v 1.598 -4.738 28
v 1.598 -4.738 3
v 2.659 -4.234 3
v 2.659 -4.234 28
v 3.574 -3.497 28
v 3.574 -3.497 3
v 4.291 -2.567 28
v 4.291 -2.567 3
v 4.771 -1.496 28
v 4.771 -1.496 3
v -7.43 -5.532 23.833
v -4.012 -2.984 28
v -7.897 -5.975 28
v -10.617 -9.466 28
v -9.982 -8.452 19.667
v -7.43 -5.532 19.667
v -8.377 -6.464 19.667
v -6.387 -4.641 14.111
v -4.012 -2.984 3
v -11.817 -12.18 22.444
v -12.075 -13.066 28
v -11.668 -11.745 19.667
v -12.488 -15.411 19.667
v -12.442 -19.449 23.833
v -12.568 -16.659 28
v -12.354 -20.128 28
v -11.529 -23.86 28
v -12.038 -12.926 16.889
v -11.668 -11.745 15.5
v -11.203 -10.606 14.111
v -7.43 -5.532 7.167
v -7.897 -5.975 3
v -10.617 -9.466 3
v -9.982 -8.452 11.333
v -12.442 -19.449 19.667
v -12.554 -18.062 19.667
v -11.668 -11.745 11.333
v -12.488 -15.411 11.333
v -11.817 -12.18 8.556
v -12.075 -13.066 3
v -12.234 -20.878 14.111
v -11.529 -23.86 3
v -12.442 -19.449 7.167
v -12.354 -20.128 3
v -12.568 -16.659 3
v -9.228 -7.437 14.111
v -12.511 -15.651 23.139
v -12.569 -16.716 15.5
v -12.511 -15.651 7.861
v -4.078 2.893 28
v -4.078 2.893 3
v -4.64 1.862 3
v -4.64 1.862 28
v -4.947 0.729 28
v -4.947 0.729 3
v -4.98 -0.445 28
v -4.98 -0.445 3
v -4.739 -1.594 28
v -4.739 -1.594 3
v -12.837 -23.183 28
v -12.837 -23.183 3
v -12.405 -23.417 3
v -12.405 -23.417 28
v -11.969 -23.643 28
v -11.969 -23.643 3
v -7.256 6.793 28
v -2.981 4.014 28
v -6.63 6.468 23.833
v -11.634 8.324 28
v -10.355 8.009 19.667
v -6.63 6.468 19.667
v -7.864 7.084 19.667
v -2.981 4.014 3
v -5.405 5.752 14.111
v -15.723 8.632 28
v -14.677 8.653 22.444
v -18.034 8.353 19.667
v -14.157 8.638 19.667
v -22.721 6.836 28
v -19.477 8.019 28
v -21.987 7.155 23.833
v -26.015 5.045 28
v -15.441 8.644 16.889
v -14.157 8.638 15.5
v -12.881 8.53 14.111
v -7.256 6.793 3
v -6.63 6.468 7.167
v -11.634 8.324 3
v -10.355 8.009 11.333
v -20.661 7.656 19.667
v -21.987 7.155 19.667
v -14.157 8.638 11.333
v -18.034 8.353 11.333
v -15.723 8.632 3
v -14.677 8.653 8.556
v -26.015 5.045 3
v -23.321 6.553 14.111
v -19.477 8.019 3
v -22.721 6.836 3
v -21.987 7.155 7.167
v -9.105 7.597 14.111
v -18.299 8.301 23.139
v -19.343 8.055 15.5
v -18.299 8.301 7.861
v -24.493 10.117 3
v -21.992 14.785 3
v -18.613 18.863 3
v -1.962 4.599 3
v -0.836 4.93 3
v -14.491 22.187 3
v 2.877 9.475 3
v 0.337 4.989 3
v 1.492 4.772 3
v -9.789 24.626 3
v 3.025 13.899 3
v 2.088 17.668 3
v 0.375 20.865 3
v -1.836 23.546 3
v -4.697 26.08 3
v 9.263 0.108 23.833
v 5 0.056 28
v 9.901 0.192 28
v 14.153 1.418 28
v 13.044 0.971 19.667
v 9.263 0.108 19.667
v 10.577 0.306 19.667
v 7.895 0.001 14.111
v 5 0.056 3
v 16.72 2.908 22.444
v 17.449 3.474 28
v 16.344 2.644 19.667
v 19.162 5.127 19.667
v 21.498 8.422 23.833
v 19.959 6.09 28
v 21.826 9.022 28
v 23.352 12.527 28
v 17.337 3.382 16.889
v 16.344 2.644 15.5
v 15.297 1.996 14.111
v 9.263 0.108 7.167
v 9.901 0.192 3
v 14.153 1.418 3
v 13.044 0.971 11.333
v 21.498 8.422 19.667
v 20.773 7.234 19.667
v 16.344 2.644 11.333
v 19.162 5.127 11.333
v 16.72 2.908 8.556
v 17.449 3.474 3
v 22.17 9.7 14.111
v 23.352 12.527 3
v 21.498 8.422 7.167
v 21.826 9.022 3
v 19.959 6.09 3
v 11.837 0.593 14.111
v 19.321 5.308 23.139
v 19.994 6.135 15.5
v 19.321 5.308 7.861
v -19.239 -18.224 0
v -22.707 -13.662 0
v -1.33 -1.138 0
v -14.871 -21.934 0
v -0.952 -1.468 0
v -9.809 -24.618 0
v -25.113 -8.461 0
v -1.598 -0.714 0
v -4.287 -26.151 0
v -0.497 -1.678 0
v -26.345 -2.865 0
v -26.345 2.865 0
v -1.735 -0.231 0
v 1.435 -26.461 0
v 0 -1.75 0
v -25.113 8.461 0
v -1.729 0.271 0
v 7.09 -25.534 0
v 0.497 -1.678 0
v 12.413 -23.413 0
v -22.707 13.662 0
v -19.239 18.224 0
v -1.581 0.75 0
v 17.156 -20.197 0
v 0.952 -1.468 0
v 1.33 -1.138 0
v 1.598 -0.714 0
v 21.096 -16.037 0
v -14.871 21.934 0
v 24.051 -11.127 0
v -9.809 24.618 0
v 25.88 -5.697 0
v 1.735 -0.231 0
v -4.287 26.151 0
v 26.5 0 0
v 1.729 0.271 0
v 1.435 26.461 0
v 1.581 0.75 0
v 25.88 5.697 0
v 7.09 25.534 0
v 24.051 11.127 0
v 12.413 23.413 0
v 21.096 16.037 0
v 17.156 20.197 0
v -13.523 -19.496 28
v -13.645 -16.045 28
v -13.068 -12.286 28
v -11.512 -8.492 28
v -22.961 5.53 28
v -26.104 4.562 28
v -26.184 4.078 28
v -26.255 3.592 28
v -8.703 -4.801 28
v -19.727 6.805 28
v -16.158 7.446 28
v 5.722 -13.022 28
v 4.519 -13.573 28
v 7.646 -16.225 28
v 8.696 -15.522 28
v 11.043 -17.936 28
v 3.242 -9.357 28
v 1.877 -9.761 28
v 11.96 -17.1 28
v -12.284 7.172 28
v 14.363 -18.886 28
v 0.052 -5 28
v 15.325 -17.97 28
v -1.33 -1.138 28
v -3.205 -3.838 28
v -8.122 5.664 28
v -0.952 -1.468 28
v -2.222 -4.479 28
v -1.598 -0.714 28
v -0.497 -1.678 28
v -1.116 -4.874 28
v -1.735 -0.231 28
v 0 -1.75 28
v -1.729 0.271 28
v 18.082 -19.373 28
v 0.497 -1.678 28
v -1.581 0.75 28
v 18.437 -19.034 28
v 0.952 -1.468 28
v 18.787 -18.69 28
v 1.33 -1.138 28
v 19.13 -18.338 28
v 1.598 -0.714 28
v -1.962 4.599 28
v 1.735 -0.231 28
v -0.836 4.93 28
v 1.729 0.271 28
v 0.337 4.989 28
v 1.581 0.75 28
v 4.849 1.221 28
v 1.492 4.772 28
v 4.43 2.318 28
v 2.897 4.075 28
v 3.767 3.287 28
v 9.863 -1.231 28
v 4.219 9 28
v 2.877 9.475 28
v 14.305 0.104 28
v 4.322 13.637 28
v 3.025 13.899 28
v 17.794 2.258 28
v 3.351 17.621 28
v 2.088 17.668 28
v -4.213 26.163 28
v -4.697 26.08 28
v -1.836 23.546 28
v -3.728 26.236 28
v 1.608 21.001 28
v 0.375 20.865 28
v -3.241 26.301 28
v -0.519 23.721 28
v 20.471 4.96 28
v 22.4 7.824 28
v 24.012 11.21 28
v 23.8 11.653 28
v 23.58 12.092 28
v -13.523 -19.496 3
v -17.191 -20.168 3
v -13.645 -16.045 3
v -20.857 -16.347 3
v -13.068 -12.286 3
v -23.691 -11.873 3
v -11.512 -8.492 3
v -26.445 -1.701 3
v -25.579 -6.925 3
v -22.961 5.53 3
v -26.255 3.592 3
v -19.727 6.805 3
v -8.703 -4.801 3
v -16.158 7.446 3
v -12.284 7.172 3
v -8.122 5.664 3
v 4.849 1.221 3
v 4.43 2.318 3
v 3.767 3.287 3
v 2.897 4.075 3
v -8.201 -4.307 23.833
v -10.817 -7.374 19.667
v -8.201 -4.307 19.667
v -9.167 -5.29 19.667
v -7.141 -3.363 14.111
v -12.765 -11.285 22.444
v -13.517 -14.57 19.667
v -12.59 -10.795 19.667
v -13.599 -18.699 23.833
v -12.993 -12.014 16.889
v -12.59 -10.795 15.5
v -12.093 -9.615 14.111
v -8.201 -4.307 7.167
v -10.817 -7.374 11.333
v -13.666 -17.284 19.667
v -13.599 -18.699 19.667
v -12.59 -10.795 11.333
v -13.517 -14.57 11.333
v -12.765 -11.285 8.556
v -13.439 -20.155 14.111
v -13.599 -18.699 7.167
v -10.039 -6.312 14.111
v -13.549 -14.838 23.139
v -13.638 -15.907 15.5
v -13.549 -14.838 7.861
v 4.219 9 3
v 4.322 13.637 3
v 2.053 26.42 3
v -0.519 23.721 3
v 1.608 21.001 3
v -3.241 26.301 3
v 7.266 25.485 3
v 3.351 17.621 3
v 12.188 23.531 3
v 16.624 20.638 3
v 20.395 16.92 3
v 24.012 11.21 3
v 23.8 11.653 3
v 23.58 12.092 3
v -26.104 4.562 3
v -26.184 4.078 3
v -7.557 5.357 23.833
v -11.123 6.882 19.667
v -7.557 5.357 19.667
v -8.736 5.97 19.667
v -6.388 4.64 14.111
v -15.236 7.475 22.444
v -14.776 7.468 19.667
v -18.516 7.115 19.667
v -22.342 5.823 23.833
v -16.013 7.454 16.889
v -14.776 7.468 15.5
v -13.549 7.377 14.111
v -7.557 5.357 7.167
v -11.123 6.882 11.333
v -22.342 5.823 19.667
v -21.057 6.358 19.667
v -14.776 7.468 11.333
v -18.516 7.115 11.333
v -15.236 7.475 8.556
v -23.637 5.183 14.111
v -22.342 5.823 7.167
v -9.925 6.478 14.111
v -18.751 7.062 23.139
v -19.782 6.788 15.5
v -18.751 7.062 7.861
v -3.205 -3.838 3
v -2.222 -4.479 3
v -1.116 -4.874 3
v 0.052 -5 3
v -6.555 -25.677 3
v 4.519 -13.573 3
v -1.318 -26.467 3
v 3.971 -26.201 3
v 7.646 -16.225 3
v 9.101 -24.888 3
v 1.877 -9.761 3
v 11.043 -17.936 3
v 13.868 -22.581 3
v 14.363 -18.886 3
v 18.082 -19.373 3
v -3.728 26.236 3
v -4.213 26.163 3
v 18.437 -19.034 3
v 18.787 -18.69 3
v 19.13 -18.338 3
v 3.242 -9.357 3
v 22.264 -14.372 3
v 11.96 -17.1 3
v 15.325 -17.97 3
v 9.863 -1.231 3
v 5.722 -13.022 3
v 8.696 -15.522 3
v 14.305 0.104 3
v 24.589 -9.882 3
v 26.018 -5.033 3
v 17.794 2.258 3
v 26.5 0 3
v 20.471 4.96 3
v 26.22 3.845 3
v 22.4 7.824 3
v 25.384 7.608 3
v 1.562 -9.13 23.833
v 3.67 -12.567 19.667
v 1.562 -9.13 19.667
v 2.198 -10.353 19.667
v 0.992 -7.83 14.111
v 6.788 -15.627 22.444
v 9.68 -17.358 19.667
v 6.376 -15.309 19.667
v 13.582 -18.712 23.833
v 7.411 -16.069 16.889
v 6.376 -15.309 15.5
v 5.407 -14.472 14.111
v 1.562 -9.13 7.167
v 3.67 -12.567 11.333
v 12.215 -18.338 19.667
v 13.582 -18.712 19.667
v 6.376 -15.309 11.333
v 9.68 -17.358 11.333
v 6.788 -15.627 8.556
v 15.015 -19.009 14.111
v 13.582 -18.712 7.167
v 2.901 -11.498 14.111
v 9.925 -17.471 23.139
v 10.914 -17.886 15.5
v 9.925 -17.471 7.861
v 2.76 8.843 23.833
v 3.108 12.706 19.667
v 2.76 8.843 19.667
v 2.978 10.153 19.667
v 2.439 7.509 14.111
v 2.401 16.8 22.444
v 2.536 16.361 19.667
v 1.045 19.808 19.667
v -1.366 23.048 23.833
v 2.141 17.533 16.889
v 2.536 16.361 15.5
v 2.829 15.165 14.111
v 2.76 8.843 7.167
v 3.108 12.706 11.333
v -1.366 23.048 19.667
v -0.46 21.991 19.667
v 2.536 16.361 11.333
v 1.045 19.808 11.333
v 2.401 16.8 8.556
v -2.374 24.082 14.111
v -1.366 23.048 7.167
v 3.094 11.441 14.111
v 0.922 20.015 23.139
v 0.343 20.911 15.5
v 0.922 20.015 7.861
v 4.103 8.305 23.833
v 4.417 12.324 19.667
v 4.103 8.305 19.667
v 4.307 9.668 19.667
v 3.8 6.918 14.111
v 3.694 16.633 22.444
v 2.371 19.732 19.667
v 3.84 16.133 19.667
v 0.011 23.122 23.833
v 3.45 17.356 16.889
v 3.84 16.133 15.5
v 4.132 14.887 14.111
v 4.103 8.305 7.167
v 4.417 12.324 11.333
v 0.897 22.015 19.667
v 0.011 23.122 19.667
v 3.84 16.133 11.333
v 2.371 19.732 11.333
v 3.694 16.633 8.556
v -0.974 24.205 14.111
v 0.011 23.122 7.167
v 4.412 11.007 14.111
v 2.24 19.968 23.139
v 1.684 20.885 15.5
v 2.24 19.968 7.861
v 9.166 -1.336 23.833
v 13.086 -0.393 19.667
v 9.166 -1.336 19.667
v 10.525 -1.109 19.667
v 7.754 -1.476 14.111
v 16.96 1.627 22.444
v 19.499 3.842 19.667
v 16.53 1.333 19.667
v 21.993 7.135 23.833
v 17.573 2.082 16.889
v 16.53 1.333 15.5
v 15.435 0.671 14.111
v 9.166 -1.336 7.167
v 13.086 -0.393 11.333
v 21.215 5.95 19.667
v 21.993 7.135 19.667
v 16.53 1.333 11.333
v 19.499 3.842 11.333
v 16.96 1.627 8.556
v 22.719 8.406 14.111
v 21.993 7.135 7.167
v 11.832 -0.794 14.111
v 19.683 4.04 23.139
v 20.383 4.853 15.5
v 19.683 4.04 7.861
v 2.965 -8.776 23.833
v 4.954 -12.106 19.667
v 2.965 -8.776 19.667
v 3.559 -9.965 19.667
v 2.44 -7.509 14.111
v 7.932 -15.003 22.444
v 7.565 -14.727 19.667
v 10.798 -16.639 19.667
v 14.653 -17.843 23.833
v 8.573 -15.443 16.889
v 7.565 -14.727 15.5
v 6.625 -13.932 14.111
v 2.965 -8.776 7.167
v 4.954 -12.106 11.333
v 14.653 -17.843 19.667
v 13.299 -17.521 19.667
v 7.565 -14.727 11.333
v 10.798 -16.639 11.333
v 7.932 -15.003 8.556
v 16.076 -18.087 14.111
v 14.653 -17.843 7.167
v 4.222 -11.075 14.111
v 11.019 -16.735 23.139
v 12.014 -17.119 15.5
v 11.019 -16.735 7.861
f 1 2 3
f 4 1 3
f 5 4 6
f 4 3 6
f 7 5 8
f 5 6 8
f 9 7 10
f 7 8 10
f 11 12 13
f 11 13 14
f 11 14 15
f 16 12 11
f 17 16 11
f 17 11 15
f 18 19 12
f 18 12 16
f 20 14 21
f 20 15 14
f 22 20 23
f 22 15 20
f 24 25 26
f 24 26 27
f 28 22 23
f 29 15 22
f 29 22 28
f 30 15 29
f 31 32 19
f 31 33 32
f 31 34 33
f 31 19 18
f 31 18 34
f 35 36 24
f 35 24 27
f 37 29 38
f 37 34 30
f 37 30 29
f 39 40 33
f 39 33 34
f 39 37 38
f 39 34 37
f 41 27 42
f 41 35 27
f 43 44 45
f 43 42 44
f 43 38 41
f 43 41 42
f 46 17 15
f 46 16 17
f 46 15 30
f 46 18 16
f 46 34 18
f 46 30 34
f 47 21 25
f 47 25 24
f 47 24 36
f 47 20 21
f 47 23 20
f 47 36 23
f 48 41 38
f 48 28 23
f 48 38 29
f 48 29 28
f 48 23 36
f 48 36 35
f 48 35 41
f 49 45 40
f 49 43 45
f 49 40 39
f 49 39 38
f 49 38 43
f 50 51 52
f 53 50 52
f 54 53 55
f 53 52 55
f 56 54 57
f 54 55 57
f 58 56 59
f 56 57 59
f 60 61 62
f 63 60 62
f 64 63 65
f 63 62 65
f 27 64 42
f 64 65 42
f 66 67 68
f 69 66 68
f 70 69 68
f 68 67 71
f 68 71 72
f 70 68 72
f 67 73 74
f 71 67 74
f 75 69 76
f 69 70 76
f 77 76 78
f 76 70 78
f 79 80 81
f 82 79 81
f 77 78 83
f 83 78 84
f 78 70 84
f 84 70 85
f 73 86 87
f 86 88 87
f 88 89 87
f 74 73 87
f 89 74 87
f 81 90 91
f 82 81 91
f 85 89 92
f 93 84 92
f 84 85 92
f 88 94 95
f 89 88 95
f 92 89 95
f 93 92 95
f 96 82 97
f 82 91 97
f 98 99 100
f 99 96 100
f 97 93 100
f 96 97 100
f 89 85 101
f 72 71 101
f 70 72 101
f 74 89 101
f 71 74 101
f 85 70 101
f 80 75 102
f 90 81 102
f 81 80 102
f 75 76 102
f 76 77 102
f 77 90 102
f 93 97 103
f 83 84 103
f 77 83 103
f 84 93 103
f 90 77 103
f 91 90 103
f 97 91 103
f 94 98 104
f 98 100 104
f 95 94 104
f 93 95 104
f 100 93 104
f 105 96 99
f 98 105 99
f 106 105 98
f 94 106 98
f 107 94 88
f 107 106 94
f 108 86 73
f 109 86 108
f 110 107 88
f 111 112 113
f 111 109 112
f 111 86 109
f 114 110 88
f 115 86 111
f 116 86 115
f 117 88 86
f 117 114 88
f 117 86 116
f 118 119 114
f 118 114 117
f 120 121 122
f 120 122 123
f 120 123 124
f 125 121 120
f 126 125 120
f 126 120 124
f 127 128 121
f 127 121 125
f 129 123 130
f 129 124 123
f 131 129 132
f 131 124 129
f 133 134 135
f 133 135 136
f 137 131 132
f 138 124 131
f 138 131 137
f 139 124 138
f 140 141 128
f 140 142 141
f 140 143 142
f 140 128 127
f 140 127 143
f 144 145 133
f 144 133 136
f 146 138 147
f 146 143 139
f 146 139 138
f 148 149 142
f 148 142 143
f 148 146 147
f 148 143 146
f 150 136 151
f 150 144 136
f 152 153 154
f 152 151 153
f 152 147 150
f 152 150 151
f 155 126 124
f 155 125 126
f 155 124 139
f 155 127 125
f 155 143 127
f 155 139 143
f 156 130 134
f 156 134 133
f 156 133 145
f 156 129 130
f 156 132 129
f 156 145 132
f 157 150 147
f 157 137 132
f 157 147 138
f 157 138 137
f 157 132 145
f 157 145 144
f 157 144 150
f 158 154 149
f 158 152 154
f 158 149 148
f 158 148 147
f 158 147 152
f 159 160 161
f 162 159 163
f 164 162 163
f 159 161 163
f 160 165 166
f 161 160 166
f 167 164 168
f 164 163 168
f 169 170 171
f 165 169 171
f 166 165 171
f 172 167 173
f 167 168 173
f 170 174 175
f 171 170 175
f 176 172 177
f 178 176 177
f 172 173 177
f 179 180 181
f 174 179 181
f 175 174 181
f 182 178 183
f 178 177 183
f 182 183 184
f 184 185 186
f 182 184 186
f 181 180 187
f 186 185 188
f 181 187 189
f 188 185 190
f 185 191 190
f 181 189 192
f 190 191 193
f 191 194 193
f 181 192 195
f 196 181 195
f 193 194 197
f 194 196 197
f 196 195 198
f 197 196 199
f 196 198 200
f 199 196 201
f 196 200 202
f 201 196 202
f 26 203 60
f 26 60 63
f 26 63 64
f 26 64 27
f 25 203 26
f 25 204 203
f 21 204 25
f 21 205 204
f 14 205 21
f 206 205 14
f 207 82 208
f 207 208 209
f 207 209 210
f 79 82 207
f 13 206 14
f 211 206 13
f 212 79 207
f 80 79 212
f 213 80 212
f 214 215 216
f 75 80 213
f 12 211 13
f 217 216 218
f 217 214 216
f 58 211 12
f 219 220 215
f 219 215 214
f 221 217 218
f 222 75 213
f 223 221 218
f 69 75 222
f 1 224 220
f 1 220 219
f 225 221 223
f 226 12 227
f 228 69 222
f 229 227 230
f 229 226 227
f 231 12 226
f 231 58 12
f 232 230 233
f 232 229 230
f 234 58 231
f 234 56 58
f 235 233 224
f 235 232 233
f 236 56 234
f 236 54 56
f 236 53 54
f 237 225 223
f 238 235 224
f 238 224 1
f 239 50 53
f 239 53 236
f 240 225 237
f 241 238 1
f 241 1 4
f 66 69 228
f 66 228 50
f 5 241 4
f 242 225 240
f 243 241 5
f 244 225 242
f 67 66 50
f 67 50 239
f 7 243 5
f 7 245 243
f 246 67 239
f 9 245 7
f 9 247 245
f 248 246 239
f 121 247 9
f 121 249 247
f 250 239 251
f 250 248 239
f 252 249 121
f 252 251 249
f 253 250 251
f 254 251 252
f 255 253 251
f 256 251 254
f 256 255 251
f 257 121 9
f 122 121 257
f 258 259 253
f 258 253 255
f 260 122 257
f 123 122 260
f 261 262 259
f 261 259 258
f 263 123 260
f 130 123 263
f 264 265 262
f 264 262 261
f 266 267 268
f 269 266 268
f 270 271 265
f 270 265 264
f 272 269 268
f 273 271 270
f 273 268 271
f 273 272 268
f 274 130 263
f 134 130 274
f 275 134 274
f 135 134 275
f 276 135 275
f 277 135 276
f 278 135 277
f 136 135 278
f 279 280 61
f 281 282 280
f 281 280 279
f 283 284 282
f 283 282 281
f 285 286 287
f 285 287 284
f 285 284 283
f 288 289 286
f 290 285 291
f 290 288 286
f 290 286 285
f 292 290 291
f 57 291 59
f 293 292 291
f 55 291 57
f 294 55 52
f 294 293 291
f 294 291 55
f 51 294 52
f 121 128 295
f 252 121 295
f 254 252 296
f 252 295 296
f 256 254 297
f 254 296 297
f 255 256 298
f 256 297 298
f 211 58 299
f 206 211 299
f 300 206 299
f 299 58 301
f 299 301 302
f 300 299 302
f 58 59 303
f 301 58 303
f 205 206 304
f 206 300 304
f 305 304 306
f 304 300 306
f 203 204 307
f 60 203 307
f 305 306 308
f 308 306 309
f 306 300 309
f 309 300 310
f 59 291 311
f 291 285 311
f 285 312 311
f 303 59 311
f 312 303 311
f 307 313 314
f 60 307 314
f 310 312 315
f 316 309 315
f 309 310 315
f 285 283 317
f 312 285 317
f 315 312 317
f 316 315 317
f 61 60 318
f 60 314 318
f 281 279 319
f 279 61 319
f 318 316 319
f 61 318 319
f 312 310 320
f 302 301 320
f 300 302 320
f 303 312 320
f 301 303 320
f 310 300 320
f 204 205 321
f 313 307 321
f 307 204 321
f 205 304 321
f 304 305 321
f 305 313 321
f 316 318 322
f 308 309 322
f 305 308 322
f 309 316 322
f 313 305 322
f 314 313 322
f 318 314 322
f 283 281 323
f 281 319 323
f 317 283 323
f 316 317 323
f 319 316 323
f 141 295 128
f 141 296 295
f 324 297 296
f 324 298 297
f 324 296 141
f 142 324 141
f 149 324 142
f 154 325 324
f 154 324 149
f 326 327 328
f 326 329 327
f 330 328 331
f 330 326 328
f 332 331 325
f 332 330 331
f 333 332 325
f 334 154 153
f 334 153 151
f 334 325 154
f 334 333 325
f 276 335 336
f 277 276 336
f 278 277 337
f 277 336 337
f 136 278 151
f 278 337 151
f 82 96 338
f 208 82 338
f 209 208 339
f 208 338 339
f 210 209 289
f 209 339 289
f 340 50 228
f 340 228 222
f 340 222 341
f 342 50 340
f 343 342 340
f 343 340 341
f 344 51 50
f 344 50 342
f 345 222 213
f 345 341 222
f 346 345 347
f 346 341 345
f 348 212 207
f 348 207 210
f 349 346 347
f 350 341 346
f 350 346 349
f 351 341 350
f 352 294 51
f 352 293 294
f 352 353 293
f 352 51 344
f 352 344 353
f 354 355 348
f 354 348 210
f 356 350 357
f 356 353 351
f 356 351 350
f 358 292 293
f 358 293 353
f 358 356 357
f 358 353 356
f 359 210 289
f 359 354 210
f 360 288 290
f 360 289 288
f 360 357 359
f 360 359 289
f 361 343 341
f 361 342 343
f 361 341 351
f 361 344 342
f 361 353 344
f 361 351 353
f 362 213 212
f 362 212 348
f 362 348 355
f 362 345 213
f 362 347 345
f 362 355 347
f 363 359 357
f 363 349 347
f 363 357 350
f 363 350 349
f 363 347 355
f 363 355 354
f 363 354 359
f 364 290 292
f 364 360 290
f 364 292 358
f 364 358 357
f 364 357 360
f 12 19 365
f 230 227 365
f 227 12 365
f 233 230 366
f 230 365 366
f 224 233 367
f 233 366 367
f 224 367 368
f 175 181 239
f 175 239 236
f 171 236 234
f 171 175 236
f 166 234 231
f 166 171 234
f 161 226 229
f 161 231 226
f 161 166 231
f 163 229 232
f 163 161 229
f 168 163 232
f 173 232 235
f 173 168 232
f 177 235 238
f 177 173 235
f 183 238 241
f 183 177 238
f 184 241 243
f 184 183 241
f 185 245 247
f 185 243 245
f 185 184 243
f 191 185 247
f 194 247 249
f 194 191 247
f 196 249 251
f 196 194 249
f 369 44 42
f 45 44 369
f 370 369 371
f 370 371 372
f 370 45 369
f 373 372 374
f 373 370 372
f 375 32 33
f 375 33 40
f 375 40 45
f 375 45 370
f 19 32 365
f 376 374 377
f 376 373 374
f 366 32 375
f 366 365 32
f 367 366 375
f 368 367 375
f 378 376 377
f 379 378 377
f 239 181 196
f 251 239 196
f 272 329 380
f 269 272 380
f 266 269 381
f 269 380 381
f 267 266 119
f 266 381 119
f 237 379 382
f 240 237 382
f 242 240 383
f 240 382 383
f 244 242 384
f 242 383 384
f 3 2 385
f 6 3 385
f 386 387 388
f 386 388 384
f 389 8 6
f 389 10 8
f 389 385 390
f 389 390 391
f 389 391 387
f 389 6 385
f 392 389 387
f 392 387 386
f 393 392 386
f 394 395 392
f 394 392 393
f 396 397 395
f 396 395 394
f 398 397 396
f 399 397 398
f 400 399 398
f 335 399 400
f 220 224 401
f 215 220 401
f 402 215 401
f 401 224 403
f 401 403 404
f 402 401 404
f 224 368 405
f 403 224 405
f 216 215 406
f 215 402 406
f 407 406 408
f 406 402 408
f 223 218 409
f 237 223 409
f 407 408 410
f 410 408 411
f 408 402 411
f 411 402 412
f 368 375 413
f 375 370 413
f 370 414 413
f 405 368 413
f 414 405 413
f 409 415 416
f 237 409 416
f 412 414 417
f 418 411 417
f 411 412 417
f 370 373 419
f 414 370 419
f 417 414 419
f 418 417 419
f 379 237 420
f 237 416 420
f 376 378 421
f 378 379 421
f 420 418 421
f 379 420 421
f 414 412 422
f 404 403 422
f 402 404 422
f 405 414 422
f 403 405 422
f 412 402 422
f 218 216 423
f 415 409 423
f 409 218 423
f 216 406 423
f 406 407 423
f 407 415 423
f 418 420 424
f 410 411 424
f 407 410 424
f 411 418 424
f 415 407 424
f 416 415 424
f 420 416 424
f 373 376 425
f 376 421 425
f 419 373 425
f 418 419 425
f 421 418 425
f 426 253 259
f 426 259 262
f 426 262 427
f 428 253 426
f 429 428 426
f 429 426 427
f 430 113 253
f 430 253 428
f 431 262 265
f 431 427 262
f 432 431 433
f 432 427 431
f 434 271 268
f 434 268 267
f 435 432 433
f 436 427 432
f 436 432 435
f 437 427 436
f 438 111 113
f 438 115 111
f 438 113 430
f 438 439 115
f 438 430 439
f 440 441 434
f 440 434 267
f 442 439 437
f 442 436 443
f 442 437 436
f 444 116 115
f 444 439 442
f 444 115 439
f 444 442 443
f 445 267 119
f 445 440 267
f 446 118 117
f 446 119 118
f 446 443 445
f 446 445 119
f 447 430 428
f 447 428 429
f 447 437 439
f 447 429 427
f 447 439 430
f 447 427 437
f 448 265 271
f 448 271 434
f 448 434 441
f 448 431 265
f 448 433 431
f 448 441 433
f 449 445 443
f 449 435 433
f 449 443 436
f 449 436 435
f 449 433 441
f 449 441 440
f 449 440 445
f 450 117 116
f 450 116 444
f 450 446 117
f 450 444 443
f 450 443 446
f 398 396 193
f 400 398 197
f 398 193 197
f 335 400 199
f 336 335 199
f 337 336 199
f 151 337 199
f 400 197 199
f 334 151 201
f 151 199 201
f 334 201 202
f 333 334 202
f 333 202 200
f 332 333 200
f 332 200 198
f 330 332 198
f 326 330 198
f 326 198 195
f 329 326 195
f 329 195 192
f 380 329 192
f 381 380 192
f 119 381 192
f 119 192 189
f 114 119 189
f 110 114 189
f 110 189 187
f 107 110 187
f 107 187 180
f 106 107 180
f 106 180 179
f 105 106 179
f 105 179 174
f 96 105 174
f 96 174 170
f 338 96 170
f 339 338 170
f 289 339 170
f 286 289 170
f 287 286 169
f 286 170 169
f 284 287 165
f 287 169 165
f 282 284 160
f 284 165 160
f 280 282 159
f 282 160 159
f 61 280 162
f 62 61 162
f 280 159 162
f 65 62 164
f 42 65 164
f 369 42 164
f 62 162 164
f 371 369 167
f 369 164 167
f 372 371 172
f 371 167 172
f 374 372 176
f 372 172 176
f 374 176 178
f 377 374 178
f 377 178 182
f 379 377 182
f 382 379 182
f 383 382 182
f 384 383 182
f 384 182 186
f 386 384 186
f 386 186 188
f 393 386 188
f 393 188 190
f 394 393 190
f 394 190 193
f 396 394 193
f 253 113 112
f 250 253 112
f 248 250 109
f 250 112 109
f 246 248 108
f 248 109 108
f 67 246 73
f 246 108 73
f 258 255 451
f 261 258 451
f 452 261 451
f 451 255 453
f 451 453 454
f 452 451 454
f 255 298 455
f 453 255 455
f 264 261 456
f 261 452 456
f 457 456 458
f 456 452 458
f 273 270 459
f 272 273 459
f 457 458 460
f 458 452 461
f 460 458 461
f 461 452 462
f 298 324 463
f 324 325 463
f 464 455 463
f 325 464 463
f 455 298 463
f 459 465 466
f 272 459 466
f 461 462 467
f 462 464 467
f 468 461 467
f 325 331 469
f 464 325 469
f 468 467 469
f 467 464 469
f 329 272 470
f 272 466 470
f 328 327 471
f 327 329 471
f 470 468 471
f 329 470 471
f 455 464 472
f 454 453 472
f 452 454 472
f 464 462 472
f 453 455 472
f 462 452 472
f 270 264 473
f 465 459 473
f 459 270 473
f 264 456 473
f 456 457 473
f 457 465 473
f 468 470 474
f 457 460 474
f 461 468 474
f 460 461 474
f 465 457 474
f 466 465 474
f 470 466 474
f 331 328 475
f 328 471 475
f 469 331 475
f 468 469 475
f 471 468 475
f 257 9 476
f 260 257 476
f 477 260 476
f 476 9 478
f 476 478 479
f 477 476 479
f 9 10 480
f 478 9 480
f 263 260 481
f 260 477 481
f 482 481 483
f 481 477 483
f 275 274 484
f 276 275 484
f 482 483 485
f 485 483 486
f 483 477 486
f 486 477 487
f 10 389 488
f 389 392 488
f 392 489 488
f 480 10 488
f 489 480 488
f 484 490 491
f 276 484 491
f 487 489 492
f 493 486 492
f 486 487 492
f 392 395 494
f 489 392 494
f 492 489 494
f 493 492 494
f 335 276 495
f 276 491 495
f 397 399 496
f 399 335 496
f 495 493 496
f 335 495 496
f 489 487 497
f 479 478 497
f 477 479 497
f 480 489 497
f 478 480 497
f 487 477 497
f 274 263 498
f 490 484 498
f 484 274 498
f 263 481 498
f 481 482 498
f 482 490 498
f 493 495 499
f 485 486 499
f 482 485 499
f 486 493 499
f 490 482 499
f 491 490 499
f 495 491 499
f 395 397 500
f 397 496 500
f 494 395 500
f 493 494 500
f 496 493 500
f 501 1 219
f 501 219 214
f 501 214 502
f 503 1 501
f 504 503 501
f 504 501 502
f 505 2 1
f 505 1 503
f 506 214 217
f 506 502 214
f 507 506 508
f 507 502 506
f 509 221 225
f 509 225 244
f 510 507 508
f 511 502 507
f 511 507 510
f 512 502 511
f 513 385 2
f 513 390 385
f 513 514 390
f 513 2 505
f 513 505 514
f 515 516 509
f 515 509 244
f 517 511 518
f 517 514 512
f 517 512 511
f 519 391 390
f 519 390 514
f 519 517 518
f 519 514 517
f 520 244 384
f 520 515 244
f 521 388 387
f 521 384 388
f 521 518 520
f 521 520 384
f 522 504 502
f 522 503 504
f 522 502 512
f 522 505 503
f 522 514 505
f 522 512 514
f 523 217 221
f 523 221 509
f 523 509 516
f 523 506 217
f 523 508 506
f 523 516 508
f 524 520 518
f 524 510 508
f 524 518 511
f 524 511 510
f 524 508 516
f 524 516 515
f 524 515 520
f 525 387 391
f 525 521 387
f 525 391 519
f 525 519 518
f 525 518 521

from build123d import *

# Parameters (mm, degrees)
SKETCH1_R           = 26.5
SKETCH1_R_2         = 1.75
BOSS_EXTRUDE1_DEPTH = 3
SKETCH2_R           = 5
SKETCH2_R_2         = 1.75
BOSS_EXTRUDE2_DEPTH = 25
BOSS_EXTRUDE3_START = -28
BOSS_EXTRUDE3_DEPTH = 28
BOSS_EXTRUDE4_DEPTH = 25
CIRPATTERN1_COUNT   = 5


with BuildPart() as part:
    # Sketch1 → Boss-Extrude1 (new body)
    with BuildSketch(Plane.XY):
        Circle(SKETCH1_R)
        Circle(SKETCH1_R_2, mode=Mode.SUBTRACT)
    extrude(amount=BOSS_EXTRUDE1_DEPTH)

    # Sketch2 → Boss-Extrude2 (add)
    with BuildSketch(Plane.XY.offset(3)):
        Circle(SKETCH2_R)
        Circle(SKETCH2_R_2, mode=Mode.SUBTRACT)
    extrude(amount=BOSS_EXTRUDE2_DEPTH)

    # Sketch3 → Boss-Extrude3 (add)
    with BuildSketch(Plane.XY.offset(28).offset(BOSS_EXTRUDE3_START)):
        with BuildLine():
            ThreePointArc((1.58113883, 0.75), (0, 1.75), (-1.58113883, 0.75))
            Line((-1.58113883, 0.75), (0, 0.75))
            Line((0, 0.75), (1.58113883, 0.75))
        make_face()
    extrude(amount=BOSS_EXTRUDE3_DEPTH)

    # Sketch4 → Boss-Extrude4 (add)
    with BuildSketch(Plane.XY.offset(3)):
        with BuildLine():
            ThreePointArc((1.491525209, 4.772352937), (2.221644371, 4.479318731), (2.89676068, 4.075386799))
            add(Edge.make_bspline(
                [(2.89676068, 4.075386799), (6.200814746, 12.743614818), (4.154792704, 20.152161031), (-3.241305446, 26.301025436)],
                knots=[0.132924517, 0.132924517, 0.132924517, 0.132924517, 1, 1, 1, 1], degree=3))
            ThreePointArc((-3.241305446, 26.301025436), (-3.970865914, 26.200805787), (-4.697359939, 26.080352943))
            add(Edge.make_bspline(
                [(1.491525209, 4.772352937), (4.947392891, 13.120869253), (2.884431175, 20.223535921), (-4.697359939, 26.080352943)],
                knots=[0.156414662, 0.156414662, 0.156414662, 0.156414662, 1, 1, 1, 1], degree=3))
        make_face()
    boss_extrude4 = extrude(amount=BOSS_EXTRUDE4_DEPTH)

    # CirPattern1: Boss-Extrude4 ×5 about axis
    cirpattern1_axis = Axis((0, 0, 0), (0, 0, -1))
    for i in range(1, CIRPATTERN1_COUNT):
        add(boss_extrude4.rotate(cirpattern1_axis, i * 360 / CIRPATTERN1_COUNT))


solid = part.part
